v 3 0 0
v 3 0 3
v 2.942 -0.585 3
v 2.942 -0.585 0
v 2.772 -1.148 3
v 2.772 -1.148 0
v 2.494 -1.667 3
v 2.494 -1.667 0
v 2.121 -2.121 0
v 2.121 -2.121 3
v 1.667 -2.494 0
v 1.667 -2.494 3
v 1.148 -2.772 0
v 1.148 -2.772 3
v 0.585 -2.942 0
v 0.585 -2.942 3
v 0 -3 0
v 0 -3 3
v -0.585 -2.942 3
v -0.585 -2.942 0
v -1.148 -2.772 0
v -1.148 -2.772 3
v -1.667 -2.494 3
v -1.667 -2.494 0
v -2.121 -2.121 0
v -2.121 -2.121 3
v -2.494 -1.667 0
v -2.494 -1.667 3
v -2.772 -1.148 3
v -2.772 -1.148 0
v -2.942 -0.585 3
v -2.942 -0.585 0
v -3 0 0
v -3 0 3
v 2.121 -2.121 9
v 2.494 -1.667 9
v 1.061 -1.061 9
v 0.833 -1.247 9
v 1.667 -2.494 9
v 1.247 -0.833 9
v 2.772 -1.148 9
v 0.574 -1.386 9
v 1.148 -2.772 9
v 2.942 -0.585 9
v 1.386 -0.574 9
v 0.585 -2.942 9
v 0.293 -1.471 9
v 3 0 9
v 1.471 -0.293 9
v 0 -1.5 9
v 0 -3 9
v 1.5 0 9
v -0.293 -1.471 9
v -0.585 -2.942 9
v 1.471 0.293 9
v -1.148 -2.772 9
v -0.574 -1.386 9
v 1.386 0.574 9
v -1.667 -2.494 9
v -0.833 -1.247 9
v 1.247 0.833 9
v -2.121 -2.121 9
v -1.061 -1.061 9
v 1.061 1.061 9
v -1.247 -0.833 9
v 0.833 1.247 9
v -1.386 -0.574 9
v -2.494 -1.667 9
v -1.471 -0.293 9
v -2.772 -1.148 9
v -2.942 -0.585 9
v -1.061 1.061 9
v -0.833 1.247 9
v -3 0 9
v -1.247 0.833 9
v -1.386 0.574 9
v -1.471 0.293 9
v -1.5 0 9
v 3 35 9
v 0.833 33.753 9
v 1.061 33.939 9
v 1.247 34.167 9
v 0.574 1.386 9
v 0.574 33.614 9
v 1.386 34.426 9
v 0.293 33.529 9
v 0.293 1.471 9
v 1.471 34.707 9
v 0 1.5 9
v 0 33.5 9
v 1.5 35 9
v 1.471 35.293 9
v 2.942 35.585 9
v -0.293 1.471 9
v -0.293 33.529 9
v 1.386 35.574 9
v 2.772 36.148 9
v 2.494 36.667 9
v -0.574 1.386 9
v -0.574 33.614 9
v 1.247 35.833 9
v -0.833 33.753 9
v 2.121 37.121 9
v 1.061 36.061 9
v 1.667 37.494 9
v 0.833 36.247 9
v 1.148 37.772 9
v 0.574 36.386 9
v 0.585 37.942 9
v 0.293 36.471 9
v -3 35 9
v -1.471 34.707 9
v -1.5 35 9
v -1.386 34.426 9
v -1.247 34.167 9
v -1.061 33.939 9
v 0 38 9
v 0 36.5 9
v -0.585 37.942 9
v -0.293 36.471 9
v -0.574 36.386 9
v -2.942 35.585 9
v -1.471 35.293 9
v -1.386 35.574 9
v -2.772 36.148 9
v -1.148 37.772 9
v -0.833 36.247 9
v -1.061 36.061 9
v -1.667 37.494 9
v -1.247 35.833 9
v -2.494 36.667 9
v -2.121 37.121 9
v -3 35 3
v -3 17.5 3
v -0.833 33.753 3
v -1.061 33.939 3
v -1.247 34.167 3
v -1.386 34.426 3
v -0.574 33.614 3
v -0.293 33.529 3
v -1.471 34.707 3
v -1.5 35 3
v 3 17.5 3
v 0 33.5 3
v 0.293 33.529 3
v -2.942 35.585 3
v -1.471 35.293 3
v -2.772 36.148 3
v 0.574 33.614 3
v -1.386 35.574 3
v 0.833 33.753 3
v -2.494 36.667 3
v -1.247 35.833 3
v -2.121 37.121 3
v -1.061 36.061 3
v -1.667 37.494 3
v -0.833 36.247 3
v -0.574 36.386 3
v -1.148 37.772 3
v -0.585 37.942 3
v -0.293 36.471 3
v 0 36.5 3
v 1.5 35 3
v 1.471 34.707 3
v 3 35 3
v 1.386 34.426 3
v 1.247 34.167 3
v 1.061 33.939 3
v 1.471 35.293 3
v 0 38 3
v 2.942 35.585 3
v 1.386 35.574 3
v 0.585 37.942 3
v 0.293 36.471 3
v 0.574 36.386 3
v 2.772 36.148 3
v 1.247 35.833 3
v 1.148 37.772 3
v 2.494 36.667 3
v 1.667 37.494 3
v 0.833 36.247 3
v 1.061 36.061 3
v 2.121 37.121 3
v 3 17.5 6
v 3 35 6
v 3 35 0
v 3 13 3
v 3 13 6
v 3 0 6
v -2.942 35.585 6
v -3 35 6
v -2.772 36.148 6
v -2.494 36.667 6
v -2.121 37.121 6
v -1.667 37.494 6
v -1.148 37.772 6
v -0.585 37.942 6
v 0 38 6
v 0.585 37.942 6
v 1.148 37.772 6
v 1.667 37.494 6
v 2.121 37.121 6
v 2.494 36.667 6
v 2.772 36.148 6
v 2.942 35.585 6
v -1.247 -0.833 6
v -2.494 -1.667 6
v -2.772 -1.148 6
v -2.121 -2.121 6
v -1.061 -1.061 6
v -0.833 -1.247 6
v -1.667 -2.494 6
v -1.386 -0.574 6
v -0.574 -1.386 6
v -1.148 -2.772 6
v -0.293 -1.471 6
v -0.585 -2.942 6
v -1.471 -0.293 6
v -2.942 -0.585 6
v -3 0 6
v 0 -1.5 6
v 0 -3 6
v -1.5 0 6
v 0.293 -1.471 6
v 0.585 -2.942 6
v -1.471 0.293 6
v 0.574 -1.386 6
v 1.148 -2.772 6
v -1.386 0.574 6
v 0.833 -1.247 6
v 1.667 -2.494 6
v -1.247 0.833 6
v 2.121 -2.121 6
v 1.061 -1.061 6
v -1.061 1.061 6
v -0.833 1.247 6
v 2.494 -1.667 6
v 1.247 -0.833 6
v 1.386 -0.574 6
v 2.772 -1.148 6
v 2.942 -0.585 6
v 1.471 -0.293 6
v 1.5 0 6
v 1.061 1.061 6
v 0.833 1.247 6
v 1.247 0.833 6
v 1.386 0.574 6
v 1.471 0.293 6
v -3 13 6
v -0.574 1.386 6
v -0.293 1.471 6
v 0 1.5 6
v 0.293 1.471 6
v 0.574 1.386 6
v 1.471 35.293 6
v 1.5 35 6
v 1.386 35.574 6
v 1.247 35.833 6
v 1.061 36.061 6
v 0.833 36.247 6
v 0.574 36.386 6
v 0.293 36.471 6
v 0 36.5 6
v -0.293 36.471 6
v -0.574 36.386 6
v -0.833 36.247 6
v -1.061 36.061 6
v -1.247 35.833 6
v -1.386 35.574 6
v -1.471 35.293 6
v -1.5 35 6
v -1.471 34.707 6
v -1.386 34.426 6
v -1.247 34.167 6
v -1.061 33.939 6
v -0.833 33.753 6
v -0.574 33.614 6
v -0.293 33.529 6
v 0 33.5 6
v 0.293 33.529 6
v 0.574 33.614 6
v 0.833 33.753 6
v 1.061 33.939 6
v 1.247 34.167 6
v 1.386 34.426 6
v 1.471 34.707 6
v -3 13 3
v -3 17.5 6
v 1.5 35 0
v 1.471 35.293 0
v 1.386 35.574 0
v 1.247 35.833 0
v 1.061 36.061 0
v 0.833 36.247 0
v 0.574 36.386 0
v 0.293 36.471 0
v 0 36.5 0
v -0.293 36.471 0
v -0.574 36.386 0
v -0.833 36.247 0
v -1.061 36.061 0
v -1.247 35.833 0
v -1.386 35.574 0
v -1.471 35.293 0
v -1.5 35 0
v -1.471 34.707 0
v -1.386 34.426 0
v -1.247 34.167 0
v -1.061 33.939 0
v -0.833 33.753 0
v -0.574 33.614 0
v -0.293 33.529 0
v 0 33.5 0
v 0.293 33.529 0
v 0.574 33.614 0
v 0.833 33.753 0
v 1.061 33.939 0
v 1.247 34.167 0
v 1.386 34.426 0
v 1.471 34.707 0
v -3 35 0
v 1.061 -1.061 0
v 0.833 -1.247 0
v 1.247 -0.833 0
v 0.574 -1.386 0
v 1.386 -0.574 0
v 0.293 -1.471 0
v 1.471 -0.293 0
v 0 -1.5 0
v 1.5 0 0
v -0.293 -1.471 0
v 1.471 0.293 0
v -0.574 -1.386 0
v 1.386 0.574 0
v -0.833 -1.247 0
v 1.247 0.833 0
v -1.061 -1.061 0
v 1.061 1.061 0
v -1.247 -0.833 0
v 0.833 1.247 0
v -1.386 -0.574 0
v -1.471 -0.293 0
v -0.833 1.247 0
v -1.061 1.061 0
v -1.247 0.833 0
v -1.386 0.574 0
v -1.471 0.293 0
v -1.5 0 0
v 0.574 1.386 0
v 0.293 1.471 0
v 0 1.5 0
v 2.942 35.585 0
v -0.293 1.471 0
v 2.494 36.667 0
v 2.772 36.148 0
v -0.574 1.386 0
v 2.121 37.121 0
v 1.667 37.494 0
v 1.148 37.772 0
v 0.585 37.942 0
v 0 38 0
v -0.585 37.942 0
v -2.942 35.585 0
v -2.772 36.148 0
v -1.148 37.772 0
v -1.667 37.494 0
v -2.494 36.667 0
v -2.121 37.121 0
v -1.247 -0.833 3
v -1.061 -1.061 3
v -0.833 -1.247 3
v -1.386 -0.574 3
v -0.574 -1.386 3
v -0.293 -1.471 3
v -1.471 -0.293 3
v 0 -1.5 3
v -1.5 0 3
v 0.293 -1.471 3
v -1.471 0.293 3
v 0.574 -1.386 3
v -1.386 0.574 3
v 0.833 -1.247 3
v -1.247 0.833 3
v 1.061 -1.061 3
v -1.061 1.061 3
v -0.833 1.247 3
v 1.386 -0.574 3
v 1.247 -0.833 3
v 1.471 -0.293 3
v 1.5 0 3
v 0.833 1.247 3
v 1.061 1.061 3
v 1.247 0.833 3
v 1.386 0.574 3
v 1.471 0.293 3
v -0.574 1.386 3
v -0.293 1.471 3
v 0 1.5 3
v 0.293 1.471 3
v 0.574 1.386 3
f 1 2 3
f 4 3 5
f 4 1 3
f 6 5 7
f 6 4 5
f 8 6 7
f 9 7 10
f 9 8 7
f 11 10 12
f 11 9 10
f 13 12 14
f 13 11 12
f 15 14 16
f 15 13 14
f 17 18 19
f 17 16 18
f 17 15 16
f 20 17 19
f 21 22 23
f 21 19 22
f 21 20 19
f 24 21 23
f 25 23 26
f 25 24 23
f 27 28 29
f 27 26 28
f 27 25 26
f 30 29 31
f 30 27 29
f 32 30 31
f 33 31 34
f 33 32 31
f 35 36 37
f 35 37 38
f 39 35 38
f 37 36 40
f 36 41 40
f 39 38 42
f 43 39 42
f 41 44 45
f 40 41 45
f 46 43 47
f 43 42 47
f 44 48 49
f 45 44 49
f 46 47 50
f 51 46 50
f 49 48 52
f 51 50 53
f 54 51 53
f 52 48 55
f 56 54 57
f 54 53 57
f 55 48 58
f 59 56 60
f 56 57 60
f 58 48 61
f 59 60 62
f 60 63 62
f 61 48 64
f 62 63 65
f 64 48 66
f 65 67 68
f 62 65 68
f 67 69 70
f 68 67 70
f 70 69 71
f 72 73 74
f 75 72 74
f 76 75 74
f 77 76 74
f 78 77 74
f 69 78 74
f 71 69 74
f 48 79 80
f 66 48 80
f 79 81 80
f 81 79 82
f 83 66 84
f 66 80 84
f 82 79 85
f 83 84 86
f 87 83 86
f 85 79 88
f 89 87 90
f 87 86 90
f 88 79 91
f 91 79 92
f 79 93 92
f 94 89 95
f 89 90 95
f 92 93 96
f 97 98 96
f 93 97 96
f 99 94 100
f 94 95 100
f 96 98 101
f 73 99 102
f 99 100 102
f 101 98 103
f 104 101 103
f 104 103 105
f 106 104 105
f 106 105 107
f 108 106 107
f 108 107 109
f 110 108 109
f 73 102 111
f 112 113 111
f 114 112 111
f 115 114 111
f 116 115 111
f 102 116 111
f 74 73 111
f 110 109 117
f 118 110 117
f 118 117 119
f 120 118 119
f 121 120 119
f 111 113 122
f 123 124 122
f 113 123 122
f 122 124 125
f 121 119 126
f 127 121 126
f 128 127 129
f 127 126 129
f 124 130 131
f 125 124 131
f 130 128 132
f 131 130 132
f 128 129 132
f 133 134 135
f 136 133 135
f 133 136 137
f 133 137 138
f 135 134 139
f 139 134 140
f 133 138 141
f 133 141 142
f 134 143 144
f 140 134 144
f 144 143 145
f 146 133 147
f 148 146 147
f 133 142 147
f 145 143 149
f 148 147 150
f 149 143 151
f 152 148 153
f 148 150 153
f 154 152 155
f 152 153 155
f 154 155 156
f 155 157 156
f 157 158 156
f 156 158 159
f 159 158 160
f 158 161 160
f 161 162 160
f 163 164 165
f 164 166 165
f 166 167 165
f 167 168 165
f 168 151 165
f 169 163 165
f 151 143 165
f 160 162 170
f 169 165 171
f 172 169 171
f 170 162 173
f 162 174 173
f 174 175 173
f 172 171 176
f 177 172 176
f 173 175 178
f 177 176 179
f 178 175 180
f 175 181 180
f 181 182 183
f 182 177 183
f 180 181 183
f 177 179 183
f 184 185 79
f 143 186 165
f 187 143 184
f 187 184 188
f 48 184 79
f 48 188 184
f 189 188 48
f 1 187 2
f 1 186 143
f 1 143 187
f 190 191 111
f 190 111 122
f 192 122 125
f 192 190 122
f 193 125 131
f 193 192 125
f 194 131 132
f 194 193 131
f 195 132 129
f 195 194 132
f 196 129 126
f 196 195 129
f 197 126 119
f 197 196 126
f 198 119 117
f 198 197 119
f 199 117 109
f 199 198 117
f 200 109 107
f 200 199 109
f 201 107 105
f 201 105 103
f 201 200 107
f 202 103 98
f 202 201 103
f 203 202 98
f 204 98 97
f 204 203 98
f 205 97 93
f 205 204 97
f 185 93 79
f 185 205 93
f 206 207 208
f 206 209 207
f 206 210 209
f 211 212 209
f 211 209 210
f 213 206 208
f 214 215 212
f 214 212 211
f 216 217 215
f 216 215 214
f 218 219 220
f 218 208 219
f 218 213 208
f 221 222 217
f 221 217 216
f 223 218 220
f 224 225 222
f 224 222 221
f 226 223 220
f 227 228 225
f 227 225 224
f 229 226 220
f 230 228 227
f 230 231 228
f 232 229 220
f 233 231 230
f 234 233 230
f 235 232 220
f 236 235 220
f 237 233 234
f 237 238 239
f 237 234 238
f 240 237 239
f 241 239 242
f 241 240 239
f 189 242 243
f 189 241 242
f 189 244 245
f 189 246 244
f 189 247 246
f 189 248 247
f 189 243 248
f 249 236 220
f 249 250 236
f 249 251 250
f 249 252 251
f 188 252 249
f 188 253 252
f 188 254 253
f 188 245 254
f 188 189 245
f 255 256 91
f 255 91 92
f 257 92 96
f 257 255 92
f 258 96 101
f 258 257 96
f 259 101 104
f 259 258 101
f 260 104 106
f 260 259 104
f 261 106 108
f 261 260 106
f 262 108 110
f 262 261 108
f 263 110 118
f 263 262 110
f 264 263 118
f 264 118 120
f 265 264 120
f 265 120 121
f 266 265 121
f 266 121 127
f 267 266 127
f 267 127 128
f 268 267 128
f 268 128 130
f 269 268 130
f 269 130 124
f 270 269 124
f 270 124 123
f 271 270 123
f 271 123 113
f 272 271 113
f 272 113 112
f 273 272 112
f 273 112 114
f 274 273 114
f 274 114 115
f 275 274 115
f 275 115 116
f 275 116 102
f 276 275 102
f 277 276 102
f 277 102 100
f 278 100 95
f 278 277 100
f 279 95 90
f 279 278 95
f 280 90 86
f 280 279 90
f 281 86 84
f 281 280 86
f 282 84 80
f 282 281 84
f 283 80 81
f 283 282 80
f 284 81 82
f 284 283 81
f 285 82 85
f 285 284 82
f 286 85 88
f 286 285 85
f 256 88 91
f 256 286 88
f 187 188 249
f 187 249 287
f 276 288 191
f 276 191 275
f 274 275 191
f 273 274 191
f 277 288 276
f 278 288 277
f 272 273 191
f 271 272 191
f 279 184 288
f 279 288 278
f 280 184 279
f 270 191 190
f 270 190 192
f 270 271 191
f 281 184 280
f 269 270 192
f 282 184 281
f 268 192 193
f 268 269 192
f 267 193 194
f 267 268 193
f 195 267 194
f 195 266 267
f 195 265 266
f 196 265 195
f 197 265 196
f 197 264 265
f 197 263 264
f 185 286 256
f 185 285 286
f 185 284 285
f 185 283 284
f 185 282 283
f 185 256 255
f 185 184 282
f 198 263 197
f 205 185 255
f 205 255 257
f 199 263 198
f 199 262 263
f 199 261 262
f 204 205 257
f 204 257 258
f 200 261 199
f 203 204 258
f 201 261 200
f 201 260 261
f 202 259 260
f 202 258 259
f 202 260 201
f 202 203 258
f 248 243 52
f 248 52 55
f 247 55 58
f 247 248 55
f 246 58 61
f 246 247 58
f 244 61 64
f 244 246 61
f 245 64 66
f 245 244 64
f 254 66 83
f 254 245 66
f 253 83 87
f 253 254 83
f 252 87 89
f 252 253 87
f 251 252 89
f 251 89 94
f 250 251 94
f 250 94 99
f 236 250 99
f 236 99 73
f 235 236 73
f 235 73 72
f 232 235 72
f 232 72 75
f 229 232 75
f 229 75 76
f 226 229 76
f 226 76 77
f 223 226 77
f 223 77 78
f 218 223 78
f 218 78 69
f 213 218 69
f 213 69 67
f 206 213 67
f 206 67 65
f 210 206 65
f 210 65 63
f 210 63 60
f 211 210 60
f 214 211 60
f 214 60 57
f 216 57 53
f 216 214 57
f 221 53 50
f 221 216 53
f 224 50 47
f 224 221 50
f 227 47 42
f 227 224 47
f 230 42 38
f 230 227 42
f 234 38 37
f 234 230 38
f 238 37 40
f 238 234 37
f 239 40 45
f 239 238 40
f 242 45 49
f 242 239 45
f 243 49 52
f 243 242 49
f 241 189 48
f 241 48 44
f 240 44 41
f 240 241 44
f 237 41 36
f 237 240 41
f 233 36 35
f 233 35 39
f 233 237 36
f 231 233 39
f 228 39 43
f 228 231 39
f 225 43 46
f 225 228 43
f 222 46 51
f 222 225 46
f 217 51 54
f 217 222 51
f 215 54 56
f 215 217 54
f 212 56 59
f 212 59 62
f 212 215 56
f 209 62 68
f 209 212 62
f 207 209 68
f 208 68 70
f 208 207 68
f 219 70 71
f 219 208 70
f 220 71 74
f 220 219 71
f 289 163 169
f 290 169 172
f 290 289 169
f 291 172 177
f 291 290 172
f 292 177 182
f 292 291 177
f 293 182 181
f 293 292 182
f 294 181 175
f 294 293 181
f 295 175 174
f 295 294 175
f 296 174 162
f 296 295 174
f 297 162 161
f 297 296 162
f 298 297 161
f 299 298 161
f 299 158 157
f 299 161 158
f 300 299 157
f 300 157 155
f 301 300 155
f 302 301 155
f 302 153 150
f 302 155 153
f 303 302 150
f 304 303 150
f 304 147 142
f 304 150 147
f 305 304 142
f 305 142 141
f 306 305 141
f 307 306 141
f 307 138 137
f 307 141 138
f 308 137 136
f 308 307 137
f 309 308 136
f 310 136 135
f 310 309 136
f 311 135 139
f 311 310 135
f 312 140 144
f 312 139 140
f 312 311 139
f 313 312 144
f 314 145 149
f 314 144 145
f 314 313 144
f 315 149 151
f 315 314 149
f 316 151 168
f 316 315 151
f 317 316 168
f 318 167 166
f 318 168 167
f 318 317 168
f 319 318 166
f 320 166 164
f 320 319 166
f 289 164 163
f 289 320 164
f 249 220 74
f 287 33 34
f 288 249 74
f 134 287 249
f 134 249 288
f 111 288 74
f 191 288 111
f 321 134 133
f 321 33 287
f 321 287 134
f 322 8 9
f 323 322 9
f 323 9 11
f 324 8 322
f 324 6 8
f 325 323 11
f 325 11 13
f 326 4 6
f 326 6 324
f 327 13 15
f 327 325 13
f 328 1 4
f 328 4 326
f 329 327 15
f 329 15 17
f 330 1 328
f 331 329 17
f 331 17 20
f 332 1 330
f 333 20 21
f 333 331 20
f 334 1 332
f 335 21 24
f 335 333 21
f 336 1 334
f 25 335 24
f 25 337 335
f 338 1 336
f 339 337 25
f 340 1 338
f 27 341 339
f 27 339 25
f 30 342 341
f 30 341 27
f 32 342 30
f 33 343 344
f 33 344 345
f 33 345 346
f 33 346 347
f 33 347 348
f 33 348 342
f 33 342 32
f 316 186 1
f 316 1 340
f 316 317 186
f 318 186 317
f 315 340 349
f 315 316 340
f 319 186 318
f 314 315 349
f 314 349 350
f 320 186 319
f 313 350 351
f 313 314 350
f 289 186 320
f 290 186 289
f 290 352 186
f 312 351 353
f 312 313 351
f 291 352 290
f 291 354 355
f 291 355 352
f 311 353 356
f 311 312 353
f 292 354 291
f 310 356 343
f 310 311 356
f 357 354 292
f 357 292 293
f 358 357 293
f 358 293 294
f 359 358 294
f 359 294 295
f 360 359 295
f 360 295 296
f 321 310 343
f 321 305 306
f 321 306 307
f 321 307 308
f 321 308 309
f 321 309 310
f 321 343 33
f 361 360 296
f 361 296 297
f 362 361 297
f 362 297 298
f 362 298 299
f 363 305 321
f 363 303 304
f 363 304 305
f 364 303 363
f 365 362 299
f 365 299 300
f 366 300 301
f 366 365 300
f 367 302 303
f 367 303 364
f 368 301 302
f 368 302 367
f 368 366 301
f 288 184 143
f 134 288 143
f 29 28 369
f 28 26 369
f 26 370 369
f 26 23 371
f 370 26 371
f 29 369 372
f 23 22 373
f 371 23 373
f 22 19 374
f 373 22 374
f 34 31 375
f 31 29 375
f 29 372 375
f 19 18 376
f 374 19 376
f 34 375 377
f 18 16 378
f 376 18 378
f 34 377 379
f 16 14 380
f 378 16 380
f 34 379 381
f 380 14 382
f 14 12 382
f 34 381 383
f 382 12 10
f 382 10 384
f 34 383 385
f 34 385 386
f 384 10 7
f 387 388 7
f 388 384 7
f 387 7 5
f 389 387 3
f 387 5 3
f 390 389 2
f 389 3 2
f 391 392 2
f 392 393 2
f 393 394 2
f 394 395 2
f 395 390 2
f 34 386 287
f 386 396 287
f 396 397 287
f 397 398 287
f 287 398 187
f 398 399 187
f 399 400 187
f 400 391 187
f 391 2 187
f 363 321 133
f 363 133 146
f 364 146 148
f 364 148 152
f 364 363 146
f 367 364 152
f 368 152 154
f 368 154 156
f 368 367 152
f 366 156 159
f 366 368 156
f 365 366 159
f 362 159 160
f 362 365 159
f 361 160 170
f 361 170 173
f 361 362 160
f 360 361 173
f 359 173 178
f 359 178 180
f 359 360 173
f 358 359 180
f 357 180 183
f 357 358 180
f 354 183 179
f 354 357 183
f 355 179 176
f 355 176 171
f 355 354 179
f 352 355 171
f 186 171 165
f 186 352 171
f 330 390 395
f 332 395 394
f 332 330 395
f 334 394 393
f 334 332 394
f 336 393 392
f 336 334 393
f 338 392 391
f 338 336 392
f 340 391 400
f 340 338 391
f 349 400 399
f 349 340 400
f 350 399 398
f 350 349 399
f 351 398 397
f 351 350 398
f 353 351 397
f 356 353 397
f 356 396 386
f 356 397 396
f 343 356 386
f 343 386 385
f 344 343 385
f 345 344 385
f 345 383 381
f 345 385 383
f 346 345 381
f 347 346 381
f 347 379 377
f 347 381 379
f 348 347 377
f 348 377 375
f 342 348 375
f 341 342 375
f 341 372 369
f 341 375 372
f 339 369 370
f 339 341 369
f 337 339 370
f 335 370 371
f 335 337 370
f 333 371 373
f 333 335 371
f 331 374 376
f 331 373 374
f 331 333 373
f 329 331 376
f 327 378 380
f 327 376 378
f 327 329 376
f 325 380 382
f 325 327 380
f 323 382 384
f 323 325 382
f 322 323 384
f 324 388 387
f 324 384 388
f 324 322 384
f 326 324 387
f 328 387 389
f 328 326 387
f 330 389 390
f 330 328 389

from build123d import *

# Parameters (mm, degrees)
SCHIZZO2_R                   = 1.5
ESTRUSIONE_ESTRUSIONE1_DEPTH = 9
SCHIZZO5_W                   = 3
SCHIZZO5_H                   = 20.5
SCHIZZO5_H_2                 = 16
TAGLIO_ESTRUSIONE1_DEPTH     = 15


with BuildPart() as part:
    # Schizzo2 → Estrusione-Estrusione1 (new body)
    with BuildSketch(Plane.XY):
        with BuildLine():
            Line((-3, 0), (-3, 35))
            ThreePointArc((-3, 35), (0, 38), (3, 35))
            Line((3, 35), (3, 0))
            ThreePointArc((3, 0), (0, -3), (-3, 0))
        make_face()
        with Locations((0, 35)):
            Circle(SCHIZZO2_R, mode=Mode.SUBTRACT)
        Circle(SCHIZZO2_R, mode=Mode.SUBTRACT)
    extrude(amount=ESTRUSIONE_ESTRUSIONE1_DEPTH)

    # Schizzo5 → Taglio-Estrusione1 (cut)
    with BuildSketch(Plane(origin=(3, 0, 0), x_dir=(0, 0, -1), z_dir=(1, 0, 0))):
        with Locations((-4.5, 27.75)):
            Rectangle(SCHIZZO5_W, SCHIZZO5_H)
        with Locations((-4.5, 5)):
            Rectangle(SCHIZZO5_W, SCHIZZO5_H_2)
    extrude(amount=-TAGLIO_ESTRUSIONE1_DEPTH, mode=Mode.SUBTRACT)


solid = part.part
